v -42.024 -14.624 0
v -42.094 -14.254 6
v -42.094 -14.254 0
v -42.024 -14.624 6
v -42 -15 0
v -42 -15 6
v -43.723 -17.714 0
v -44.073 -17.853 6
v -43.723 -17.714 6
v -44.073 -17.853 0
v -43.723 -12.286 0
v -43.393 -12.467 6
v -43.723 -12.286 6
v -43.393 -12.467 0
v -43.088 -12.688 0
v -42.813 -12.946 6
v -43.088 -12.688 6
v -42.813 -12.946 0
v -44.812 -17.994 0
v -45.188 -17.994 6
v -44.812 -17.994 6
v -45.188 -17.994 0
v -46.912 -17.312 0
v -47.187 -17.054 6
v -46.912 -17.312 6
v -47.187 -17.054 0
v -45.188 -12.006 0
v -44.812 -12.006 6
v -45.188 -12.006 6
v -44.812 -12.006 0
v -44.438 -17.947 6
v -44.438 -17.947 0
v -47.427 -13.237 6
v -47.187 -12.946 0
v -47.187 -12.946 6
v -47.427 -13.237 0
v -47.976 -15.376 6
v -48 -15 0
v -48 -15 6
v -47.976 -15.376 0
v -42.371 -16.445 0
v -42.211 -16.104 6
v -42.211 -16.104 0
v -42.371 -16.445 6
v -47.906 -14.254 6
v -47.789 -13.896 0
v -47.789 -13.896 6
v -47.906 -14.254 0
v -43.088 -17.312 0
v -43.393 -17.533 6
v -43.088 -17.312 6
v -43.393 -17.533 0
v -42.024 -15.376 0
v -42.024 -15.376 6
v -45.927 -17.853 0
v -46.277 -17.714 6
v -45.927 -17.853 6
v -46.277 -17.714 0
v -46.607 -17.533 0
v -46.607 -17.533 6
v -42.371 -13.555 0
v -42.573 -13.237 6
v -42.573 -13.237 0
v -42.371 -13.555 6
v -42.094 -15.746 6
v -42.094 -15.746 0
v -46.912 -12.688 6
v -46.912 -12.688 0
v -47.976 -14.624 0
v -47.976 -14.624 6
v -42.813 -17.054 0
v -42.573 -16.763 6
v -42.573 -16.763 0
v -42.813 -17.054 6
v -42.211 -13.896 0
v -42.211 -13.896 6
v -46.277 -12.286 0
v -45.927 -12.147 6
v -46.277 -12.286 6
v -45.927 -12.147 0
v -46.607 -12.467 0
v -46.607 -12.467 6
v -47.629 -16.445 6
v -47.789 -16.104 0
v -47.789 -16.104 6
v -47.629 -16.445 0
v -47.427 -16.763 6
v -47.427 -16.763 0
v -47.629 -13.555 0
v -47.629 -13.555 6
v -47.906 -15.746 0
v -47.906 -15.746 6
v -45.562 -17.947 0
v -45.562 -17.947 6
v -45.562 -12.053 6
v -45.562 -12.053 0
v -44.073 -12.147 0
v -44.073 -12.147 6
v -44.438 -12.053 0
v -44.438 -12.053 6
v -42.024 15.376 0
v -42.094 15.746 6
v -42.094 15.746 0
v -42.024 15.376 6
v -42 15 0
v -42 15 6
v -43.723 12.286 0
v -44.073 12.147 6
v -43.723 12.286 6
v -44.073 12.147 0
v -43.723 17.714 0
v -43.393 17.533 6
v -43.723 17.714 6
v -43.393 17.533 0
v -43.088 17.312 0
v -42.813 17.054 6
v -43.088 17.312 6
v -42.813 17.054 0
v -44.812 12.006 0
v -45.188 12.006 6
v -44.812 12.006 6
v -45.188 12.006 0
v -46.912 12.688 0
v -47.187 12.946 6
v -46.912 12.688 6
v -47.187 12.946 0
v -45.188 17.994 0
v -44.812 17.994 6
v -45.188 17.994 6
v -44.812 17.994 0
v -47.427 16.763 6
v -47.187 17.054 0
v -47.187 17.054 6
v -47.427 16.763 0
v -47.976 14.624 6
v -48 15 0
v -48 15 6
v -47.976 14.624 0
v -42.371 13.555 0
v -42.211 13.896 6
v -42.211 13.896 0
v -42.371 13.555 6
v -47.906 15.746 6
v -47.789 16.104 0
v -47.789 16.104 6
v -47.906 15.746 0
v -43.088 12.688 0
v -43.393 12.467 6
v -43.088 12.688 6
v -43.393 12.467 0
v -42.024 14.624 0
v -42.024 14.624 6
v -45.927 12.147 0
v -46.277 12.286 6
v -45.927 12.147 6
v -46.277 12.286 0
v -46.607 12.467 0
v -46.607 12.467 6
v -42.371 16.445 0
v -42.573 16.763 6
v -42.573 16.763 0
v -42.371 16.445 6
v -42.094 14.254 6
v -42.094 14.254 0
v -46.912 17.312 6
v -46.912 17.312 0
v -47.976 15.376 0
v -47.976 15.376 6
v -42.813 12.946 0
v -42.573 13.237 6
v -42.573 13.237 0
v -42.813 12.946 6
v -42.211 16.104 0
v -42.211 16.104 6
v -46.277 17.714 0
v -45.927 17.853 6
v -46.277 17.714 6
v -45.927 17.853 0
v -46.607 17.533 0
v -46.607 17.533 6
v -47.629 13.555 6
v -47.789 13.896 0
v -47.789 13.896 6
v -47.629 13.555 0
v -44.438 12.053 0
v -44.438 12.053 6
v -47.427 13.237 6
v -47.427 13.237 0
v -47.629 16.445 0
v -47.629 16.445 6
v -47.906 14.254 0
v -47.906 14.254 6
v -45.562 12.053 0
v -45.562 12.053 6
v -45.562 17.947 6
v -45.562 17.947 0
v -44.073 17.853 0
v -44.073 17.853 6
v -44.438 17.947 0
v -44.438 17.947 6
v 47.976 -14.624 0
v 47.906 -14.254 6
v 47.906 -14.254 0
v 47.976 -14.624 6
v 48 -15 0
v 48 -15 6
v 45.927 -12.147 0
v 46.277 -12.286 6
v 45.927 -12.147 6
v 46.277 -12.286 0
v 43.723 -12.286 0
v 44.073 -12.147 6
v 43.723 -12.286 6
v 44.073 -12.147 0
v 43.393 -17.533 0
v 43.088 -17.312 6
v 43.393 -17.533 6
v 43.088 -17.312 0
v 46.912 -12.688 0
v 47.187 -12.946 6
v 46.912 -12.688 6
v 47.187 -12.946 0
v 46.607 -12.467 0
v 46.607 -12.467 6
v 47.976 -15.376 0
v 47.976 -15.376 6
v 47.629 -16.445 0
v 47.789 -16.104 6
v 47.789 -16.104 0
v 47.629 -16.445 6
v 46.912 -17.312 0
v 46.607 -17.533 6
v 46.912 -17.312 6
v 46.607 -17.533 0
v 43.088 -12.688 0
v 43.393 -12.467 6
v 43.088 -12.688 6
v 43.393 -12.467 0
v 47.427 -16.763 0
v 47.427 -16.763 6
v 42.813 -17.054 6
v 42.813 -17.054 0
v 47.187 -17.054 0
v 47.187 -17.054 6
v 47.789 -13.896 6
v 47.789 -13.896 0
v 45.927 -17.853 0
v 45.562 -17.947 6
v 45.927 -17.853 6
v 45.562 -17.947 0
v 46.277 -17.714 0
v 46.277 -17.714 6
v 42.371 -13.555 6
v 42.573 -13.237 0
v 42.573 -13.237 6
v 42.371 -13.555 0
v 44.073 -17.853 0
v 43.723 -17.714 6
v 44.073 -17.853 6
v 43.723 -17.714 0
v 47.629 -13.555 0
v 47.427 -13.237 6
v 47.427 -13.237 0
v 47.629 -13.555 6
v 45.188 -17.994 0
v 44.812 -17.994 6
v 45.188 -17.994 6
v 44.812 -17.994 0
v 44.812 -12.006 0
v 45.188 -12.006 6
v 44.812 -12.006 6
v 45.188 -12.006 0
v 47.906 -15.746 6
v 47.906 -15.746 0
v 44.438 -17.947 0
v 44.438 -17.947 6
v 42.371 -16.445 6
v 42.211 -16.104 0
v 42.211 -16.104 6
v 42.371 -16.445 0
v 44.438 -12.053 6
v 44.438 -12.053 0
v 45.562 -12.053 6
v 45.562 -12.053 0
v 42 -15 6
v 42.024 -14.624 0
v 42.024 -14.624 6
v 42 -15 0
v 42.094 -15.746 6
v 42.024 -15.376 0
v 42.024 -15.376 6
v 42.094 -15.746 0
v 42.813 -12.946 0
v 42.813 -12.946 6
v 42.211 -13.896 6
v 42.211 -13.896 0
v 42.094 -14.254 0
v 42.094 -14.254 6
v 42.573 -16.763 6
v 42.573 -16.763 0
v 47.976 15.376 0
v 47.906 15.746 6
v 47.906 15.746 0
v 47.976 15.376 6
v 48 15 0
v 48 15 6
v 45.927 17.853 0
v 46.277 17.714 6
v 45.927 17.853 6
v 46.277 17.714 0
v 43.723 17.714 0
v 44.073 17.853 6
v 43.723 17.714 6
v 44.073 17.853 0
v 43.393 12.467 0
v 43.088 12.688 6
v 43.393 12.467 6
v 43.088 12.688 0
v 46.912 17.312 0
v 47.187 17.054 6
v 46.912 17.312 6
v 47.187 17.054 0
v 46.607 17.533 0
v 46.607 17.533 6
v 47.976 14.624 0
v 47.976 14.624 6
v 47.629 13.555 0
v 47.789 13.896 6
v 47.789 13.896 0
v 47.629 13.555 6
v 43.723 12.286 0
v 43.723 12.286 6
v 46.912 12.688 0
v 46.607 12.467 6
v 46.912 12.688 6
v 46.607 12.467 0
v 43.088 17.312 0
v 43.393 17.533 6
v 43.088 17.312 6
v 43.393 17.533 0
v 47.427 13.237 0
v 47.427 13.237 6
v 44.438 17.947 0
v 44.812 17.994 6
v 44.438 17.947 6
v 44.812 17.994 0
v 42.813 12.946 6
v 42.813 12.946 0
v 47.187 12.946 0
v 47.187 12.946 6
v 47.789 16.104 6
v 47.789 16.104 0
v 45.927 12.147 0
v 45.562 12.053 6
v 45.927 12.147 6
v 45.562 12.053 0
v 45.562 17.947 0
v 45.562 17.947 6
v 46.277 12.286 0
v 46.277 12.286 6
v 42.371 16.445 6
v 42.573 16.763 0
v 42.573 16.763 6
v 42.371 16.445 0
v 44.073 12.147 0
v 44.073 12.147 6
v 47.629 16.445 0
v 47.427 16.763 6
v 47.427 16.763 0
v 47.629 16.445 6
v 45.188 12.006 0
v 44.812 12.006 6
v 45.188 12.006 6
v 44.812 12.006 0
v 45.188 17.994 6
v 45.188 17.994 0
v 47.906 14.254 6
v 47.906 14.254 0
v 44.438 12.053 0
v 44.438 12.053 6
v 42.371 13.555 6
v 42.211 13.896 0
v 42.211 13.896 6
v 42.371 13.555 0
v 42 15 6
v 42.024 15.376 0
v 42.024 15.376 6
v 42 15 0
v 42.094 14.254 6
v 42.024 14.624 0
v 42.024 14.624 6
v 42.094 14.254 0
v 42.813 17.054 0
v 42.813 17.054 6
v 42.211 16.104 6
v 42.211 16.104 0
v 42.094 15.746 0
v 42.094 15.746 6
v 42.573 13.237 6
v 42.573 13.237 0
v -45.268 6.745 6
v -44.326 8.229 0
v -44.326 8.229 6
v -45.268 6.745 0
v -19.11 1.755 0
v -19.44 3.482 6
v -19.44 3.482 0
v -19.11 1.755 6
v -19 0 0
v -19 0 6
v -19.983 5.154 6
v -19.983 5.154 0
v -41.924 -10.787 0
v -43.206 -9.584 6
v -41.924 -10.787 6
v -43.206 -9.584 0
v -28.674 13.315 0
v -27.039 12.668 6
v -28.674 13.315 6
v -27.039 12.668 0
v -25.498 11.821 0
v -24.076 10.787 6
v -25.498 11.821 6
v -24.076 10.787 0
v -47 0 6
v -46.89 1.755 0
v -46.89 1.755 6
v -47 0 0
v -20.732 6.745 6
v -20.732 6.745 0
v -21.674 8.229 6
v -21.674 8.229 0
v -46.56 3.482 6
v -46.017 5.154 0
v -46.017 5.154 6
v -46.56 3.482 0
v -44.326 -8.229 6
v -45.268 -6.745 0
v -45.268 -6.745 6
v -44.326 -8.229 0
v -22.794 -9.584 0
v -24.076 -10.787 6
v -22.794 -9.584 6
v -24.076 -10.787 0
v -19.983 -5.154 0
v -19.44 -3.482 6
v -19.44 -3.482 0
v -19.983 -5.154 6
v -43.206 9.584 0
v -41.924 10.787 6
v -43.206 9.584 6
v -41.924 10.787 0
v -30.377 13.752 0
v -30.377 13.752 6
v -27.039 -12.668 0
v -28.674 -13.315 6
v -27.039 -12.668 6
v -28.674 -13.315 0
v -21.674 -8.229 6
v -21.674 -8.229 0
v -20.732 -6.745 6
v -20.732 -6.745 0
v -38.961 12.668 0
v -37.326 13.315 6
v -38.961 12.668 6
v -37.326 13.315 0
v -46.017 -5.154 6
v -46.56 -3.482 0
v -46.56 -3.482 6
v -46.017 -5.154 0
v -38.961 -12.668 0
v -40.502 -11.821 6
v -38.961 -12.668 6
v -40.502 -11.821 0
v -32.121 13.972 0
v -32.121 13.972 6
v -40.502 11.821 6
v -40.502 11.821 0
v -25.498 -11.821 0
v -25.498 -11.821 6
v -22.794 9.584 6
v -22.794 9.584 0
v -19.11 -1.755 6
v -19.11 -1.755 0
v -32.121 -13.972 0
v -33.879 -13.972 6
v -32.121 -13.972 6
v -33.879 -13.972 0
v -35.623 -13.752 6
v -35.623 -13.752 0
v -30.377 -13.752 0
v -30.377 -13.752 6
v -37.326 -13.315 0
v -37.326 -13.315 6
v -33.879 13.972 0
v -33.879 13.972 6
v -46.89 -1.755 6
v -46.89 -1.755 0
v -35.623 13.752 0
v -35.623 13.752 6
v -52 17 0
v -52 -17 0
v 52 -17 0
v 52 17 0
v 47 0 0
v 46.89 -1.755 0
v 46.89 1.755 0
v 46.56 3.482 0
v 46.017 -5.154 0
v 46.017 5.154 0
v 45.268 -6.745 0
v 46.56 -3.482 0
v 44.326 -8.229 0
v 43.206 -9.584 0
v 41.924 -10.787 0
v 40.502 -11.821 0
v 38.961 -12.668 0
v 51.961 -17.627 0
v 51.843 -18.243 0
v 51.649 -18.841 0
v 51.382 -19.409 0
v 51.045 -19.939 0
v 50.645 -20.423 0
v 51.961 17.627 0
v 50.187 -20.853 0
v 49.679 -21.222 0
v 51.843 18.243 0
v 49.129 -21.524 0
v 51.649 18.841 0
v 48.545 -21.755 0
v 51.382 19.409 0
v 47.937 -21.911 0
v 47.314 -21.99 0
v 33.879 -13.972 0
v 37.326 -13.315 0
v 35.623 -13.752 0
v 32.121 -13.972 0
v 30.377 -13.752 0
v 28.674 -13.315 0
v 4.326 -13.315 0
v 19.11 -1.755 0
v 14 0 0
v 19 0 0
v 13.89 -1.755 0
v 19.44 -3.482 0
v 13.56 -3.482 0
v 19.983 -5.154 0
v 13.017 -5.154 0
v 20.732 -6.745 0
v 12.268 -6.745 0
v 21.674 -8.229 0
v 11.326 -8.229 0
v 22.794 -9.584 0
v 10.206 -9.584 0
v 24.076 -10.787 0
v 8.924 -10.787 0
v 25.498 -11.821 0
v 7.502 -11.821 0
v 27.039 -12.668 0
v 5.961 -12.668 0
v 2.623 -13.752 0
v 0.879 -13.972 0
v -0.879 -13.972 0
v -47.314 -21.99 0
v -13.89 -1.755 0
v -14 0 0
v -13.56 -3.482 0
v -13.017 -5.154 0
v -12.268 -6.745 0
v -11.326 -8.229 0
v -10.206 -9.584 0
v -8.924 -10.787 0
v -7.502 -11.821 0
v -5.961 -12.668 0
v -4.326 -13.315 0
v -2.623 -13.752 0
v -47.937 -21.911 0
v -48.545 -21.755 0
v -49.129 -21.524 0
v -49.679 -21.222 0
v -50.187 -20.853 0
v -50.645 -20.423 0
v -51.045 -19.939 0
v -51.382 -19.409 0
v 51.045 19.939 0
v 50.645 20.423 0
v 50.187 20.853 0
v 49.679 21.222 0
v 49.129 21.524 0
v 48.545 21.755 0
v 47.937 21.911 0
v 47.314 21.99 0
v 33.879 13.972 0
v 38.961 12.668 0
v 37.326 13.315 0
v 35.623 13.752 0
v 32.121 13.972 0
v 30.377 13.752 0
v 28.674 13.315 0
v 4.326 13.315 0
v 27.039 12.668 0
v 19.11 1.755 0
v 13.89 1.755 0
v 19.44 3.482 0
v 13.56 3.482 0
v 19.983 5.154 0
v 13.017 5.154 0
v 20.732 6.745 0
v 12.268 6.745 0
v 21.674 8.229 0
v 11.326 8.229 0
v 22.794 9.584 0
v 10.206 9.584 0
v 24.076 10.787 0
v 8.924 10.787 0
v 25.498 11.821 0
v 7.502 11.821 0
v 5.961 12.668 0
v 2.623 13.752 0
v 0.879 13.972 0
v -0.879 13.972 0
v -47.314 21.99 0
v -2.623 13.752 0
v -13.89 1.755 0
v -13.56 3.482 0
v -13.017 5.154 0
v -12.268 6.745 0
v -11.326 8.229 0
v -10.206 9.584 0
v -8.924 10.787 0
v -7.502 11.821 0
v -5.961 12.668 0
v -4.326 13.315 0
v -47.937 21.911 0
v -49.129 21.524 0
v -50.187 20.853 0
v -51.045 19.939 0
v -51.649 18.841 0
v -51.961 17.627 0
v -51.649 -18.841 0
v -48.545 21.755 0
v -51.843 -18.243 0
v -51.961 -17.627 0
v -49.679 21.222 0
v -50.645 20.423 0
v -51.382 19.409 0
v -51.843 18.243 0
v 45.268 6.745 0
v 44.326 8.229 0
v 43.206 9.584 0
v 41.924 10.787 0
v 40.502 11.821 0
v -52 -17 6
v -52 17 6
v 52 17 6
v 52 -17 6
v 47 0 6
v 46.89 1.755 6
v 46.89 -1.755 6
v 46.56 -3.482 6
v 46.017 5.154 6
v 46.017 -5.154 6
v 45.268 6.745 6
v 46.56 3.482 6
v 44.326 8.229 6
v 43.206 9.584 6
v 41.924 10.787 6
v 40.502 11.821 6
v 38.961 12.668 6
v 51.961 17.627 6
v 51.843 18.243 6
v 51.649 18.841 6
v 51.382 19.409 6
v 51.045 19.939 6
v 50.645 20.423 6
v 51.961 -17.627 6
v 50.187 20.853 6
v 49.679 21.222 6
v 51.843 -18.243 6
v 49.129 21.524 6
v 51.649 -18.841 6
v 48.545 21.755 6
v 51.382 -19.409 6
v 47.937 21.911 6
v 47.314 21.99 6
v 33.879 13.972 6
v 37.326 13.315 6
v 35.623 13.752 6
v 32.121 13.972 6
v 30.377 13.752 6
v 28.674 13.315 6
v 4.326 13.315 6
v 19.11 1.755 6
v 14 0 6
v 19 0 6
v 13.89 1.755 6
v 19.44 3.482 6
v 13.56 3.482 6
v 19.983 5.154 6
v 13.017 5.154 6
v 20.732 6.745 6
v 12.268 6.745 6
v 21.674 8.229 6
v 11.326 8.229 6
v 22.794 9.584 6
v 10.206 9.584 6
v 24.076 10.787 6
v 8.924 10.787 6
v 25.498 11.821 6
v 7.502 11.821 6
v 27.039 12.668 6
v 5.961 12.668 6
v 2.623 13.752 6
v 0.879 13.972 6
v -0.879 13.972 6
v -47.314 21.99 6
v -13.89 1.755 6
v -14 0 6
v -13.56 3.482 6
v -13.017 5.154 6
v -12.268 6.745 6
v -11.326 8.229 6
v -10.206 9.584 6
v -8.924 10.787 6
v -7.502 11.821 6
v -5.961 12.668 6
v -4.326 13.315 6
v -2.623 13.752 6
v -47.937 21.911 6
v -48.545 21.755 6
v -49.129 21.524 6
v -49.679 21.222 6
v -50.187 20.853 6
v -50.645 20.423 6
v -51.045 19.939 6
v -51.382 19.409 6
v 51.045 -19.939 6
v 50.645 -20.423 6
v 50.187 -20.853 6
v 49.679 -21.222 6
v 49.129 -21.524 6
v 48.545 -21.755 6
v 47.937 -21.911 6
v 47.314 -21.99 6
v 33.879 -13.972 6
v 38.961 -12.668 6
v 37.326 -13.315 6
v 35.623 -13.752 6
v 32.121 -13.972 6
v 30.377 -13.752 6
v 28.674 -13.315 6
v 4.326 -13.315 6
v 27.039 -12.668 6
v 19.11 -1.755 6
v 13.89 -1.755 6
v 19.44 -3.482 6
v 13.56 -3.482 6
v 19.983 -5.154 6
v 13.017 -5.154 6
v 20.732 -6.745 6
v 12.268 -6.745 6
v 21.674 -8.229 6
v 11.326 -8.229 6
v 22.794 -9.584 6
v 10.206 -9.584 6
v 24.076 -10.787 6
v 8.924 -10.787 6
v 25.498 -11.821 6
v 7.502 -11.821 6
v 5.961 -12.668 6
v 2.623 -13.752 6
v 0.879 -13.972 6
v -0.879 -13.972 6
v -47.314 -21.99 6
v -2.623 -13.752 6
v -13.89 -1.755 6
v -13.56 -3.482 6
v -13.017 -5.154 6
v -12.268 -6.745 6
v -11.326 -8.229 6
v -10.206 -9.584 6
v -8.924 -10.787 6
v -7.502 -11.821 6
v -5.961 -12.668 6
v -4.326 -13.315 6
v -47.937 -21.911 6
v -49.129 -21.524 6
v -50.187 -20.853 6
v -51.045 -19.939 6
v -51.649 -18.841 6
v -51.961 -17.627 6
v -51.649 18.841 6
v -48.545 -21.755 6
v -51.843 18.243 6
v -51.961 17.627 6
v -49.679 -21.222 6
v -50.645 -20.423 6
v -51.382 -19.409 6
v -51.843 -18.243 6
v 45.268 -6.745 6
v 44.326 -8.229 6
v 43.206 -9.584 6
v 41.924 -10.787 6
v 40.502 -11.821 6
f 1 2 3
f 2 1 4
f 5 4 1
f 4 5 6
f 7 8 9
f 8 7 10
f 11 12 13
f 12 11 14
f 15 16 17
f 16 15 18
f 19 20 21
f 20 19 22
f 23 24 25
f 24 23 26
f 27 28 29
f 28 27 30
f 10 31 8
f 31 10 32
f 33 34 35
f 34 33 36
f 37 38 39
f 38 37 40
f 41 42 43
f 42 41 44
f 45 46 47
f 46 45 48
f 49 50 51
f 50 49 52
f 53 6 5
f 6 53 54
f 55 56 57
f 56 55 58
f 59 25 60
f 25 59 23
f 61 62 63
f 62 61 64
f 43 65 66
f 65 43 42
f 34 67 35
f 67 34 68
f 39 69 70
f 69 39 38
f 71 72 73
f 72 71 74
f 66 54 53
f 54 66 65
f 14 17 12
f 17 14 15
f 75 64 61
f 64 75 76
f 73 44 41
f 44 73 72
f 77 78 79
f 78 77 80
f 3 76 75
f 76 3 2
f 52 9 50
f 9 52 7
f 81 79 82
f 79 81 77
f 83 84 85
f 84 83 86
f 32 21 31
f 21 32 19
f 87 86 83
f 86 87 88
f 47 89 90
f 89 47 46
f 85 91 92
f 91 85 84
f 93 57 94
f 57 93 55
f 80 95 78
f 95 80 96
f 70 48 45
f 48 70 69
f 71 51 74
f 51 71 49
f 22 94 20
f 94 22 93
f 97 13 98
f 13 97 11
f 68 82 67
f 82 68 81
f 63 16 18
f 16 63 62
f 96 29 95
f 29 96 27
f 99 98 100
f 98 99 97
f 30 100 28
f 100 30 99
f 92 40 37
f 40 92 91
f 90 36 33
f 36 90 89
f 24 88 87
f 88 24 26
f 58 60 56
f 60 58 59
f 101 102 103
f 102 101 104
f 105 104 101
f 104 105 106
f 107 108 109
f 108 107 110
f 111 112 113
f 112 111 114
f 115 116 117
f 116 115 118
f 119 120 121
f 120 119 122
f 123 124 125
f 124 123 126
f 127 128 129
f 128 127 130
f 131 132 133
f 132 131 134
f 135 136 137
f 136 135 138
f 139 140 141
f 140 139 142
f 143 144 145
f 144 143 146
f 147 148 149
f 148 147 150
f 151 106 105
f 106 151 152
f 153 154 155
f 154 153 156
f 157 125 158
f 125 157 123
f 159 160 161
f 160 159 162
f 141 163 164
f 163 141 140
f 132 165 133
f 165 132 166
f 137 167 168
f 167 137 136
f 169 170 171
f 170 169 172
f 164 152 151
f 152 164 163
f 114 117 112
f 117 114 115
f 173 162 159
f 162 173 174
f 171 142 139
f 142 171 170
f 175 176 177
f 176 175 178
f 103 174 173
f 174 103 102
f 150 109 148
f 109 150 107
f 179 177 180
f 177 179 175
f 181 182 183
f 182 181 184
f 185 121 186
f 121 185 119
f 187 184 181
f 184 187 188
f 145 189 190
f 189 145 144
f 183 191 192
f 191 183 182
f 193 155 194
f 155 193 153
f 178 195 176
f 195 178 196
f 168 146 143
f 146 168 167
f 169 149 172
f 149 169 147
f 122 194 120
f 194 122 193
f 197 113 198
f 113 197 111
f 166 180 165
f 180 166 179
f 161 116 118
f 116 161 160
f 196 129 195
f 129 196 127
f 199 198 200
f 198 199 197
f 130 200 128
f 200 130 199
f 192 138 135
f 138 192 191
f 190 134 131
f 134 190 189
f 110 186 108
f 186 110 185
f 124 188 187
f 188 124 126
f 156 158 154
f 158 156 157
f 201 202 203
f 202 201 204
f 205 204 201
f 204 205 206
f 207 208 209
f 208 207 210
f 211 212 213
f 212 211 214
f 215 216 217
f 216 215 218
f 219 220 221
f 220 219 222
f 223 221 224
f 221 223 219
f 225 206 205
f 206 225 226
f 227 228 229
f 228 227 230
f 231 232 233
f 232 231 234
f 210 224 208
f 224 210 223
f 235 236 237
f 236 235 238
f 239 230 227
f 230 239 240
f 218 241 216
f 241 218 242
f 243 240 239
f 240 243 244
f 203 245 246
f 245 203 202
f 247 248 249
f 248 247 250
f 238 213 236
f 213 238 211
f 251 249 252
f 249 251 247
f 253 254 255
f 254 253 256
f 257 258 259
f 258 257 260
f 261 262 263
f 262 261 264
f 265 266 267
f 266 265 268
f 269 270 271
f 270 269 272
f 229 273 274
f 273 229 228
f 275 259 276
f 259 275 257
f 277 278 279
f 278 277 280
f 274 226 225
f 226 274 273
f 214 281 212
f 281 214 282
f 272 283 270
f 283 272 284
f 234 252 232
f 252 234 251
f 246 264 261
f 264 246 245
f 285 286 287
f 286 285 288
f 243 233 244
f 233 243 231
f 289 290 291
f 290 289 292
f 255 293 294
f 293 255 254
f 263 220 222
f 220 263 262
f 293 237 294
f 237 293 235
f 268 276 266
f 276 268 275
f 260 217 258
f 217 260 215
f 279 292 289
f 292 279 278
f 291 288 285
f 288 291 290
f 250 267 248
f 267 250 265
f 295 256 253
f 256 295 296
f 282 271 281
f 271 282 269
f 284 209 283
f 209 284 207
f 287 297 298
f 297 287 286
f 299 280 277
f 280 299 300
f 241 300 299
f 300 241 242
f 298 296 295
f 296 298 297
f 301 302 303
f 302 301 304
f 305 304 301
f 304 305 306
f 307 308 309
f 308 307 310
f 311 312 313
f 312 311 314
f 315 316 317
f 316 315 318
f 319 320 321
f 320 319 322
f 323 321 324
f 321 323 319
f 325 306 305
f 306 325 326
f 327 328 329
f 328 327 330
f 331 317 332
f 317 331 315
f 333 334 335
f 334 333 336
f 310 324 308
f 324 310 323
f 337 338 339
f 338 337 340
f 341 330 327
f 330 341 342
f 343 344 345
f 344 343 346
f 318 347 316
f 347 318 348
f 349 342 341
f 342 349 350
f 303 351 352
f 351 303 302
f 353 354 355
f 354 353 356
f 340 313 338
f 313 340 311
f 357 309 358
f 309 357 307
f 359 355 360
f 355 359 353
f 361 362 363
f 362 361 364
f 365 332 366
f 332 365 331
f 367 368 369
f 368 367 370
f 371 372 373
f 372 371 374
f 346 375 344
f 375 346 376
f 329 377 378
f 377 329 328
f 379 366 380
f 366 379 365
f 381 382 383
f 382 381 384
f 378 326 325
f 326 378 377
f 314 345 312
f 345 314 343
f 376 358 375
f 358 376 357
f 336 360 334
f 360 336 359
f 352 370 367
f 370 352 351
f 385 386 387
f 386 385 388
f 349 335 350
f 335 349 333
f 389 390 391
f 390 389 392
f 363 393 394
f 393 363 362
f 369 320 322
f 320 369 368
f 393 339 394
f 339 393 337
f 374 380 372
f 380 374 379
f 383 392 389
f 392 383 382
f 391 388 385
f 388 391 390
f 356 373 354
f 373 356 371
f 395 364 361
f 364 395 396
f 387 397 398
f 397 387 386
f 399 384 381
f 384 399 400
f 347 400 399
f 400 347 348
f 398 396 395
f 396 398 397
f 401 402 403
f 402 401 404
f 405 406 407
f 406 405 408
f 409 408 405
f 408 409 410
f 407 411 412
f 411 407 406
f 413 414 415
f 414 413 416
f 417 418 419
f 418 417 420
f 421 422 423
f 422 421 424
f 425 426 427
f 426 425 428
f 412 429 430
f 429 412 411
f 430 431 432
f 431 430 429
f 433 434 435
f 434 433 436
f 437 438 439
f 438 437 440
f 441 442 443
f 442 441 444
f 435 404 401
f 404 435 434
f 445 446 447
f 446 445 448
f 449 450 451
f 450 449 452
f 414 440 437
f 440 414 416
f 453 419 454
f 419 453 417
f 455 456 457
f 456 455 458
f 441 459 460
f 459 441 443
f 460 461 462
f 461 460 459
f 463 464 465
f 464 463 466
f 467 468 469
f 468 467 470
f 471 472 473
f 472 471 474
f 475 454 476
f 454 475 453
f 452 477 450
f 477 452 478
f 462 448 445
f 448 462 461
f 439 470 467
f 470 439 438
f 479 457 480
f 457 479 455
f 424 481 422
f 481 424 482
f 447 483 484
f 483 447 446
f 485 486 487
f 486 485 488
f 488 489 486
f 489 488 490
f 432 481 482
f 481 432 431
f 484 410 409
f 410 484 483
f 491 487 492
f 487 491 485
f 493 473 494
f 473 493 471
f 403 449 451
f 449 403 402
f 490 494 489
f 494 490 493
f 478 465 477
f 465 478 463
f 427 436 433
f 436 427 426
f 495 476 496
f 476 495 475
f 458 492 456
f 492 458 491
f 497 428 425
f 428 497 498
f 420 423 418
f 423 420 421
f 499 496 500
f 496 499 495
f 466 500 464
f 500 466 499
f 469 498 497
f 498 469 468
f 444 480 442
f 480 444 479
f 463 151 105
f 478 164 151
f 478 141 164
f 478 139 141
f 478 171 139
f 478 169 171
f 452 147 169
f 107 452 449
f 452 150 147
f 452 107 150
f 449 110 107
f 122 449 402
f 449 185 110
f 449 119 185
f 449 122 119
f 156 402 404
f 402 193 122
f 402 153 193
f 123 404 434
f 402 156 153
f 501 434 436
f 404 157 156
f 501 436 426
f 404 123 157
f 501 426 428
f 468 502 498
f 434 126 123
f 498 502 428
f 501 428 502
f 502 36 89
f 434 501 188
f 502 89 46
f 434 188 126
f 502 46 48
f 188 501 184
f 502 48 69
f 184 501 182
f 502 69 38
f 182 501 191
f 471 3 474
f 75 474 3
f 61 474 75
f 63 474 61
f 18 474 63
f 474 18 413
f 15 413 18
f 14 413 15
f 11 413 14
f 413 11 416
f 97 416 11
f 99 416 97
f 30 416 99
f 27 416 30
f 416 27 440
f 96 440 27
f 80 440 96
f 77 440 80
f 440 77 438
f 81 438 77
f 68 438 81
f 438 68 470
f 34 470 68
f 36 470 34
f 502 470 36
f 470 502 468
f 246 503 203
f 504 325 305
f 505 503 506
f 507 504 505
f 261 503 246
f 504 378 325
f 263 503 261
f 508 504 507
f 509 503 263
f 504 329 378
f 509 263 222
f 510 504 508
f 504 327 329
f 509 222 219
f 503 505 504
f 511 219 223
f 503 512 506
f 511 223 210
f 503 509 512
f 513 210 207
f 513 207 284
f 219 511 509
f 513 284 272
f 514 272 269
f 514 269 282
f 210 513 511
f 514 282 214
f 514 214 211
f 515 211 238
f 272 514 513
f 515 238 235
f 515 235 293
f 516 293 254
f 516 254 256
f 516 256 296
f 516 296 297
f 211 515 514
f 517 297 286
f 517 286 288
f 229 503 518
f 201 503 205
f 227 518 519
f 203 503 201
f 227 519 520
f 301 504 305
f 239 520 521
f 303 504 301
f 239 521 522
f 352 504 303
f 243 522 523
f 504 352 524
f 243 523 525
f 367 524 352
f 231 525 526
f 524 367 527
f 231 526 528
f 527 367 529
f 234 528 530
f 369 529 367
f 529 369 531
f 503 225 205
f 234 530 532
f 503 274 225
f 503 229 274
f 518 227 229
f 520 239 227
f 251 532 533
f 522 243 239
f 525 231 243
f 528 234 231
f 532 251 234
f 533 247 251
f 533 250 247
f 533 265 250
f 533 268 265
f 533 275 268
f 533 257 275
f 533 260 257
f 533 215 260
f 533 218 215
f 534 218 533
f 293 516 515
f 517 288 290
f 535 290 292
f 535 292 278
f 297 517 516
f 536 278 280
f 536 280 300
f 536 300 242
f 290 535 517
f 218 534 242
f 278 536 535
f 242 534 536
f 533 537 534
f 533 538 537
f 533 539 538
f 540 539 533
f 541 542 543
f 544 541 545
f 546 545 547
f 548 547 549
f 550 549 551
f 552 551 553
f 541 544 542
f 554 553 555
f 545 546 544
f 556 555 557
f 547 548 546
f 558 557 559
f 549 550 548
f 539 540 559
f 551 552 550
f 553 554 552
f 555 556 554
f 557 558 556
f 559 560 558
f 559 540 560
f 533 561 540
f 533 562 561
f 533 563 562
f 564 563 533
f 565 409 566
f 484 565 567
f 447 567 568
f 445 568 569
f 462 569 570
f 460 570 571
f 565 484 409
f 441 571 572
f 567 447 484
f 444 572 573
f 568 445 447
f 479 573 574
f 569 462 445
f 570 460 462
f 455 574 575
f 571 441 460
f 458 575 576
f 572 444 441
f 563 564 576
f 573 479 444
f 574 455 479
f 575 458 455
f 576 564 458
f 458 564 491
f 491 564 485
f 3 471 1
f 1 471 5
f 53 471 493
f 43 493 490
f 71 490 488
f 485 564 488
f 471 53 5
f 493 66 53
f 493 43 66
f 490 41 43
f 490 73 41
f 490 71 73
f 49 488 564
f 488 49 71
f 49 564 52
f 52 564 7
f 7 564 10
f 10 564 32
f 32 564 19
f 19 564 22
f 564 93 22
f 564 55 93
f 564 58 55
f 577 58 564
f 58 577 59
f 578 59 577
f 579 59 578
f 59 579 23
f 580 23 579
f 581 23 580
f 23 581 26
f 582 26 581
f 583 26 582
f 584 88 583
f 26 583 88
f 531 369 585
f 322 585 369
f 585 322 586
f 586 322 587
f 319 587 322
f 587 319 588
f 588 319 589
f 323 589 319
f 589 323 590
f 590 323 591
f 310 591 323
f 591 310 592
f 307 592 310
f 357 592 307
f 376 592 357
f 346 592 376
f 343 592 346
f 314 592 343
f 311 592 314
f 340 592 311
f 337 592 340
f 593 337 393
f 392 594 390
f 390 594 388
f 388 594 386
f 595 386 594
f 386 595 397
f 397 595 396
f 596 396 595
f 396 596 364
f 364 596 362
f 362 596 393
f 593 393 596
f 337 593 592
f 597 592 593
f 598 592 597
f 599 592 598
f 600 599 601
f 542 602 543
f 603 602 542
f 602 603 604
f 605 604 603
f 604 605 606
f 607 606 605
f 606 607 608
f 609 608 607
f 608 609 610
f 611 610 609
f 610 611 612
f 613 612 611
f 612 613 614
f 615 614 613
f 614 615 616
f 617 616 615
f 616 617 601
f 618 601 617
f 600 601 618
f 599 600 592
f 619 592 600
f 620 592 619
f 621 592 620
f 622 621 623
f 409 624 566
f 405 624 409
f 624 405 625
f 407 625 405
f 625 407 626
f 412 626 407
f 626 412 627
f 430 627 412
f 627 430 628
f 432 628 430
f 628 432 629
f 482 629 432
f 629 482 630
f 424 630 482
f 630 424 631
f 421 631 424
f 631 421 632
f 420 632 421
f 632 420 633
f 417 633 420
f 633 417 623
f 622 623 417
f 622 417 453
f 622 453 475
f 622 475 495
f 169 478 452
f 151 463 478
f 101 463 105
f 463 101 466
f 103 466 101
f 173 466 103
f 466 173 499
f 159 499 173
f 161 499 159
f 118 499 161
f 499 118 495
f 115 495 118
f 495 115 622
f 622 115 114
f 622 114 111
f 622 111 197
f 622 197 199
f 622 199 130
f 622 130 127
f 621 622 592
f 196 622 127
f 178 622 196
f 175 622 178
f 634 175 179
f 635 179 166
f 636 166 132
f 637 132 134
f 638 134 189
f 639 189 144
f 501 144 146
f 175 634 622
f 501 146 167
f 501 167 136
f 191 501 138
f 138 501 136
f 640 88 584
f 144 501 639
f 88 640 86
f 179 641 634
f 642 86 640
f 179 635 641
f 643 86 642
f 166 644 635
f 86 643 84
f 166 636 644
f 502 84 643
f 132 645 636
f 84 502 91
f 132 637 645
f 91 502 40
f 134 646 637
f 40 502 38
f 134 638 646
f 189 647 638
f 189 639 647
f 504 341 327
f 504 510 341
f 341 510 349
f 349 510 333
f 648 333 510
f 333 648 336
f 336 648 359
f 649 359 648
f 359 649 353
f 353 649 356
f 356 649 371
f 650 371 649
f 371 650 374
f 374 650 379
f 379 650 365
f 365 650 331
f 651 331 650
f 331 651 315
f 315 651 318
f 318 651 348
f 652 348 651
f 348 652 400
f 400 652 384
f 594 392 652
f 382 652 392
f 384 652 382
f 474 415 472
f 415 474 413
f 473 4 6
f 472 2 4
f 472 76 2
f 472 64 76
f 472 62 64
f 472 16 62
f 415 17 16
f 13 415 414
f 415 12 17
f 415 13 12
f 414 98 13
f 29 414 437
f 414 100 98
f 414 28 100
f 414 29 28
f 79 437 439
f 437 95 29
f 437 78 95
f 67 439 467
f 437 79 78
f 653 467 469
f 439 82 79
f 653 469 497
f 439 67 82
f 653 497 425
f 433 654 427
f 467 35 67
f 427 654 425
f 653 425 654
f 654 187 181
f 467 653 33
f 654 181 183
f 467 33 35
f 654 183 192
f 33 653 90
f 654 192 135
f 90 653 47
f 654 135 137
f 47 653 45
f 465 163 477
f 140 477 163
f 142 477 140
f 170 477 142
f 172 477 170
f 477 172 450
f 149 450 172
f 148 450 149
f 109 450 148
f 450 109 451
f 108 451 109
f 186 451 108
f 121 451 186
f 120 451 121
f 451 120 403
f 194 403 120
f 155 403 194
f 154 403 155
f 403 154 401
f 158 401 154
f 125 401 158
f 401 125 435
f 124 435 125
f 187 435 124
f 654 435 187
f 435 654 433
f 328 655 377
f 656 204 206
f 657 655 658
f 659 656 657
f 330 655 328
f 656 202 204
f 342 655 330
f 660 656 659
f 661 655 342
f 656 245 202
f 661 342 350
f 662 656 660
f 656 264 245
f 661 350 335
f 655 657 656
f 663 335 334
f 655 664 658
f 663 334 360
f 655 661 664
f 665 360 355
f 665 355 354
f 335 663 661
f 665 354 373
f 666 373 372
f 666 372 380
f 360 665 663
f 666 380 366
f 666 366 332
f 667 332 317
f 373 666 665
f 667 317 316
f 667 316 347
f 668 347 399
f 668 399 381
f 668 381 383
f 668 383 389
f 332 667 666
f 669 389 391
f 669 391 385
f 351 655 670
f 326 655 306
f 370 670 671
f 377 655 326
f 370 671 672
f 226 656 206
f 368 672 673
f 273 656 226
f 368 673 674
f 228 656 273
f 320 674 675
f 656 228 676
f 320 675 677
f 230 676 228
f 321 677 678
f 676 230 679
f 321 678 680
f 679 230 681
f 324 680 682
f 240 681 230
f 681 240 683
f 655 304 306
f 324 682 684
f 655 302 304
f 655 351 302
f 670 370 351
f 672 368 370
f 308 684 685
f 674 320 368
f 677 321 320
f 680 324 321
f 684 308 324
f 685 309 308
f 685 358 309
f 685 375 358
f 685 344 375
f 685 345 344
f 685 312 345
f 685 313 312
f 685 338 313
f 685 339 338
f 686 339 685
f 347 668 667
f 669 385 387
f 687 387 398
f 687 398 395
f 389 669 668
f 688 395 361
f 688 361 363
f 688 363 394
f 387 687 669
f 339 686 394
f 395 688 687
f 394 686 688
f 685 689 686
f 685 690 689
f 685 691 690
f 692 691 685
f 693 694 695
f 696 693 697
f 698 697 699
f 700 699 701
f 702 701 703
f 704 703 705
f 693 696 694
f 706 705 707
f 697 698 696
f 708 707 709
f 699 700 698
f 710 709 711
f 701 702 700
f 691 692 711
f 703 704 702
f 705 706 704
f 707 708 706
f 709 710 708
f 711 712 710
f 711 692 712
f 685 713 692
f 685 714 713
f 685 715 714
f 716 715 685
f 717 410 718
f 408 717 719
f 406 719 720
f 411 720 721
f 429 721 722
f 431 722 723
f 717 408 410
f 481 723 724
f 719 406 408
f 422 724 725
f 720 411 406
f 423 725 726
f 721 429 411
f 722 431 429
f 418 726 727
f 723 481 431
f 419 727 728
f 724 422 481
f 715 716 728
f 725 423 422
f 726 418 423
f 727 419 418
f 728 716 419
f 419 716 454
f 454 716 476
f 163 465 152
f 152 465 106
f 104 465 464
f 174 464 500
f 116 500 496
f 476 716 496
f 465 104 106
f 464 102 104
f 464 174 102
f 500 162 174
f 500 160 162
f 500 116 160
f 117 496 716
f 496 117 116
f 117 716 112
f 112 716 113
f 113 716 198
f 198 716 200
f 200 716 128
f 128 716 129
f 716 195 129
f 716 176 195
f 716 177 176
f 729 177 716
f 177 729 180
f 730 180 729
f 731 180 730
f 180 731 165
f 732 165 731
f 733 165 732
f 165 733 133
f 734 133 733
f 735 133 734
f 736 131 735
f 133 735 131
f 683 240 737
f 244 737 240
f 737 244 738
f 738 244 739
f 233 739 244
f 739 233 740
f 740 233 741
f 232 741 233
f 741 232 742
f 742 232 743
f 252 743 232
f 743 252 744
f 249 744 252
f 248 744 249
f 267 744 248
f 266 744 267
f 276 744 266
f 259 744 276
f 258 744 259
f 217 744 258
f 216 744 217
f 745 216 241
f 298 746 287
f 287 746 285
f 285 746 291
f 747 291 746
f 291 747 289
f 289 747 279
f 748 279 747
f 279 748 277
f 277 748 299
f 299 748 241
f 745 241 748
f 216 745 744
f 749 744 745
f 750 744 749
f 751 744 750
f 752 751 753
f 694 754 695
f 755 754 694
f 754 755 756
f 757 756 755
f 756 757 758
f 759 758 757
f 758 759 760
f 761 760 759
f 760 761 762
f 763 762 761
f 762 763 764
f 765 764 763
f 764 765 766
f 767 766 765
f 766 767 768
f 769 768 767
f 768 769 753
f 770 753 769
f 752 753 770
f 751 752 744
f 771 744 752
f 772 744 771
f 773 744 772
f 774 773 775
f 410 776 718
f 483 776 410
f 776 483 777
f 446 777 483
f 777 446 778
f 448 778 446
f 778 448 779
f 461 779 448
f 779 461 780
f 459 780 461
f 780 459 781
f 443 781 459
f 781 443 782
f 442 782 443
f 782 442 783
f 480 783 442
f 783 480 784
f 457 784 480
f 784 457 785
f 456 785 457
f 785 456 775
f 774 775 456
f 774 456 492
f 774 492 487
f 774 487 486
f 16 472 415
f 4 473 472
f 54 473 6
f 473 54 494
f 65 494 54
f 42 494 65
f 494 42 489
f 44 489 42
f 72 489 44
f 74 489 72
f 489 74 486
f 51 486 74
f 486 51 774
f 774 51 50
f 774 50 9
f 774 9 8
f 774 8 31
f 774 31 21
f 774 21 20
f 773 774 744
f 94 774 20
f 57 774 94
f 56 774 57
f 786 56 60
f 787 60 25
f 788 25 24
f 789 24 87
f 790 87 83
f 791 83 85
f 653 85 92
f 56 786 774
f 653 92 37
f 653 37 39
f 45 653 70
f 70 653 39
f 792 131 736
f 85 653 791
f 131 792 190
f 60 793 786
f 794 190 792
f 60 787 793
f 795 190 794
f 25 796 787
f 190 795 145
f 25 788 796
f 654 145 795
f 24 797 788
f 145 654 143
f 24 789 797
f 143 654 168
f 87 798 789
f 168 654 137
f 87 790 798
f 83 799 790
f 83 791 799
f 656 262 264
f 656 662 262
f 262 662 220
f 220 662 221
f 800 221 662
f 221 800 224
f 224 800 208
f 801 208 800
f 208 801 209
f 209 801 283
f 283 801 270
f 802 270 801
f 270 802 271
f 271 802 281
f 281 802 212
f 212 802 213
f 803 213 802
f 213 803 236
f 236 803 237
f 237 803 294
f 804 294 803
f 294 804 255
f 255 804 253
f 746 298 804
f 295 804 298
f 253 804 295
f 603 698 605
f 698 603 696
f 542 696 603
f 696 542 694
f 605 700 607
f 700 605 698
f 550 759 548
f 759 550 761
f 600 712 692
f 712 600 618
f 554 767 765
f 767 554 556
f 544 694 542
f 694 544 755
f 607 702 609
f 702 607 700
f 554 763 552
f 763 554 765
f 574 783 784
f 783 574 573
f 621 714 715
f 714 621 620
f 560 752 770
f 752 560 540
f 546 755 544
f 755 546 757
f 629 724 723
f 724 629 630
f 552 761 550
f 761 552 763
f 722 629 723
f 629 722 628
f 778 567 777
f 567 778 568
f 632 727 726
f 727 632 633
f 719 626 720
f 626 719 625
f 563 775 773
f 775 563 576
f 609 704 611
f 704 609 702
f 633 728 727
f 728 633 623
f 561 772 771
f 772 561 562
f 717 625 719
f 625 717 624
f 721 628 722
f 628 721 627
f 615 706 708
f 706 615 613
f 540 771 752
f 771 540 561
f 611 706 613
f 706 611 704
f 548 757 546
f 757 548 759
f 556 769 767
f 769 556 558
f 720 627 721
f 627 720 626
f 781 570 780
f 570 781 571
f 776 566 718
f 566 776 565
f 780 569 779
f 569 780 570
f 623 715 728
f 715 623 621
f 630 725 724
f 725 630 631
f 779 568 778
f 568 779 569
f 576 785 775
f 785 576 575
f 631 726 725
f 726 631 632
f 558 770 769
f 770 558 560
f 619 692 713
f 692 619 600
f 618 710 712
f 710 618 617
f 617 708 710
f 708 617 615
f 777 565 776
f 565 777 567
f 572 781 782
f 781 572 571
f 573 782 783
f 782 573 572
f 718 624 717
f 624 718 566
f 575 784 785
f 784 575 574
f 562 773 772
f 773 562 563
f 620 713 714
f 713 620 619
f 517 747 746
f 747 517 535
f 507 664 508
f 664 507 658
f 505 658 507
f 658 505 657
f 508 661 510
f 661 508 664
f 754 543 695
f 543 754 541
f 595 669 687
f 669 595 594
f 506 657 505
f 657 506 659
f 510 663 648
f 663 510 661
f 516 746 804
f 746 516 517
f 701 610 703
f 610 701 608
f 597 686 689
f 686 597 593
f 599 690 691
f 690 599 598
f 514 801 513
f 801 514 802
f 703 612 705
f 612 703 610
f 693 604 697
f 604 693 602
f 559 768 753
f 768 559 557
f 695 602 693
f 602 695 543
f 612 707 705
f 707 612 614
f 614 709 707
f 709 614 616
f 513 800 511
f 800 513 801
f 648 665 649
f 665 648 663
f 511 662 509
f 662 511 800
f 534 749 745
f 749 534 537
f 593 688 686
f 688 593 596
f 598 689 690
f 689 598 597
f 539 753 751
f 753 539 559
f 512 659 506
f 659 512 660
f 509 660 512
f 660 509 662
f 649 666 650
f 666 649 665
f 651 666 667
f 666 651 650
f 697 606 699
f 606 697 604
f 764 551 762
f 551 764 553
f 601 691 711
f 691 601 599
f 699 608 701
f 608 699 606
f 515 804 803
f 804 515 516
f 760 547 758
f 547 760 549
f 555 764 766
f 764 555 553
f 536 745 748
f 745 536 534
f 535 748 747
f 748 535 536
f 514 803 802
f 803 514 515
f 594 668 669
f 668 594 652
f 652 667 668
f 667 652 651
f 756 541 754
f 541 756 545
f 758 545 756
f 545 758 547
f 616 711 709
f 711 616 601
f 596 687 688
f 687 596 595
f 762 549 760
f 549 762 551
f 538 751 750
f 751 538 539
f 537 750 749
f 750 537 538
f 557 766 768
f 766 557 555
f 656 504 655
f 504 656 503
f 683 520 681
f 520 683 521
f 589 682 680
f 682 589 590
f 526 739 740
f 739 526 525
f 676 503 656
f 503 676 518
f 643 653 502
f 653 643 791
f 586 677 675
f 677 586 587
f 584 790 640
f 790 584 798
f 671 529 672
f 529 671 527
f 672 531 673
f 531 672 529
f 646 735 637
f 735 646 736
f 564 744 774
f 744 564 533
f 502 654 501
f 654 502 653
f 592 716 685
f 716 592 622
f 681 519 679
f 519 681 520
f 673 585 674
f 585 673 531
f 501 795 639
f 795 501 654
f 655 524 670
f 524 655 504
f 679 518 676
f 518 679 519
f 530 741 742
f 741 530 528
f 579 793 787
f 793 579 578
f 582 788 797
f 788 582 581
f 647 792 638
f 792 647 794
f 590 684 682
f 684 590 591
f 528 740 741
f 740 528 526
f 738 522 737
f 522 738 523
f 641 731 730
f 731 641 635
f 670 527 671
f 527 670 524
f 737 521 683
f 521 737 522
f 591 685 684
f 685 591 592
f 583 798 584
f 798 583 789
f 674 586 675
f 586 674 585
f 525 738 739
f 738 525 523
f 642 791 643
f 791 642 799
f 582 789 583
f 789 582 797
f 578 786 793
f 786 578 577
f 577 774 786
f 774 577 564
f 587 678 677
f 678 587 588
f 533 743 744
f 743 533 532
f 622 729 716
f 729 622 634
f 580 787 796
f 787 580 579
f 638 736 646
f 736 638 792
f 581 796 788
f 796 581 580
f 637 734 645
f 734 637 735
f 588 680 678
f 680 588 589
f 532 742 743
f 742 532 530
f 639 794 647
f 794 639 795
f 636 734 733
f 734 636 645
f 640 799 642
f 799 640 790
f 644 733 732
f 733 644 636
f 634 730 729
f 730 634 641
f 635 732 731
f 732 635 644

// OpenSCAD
$fn = 50;


difference() {
	union() {
		hull() {
			translate(v = [-47.0000000000, 17.0000000000, 0]) {
				cylinder(h = 6, r = 5);
			}
			translate(v = [47.0000000000, 17.0000000000, 0]) {
				cylinder(h = 6, r = 5);
			}
			translate(v = [-47.0000000000, -17.0000000000, 0]) {
				cylinder(h = 6, r = 5);
			}
			translate(v = [47.0000000000, -17.0000000000, 0]) {
				cylinder(h = 6, r = 5);
			}
		}
	}
	union() {
		#translate(v = [-45.0000000000, -15.0000000000, -100.0000000000]) {
			cylinder(h = 200, r = 3.0000000000);
		}
		#translate(v = [-45.0000000000, 15.0000000000, -100.0000000000]) {
			cylinder(h = 200, r = 3.0000000000);
		}
		#translate(v = [45.0000000000, -15.0000000000, -100.0000000000]) {
			cylinder(h = 200, r = 3.0000000000);
		}
		#translate(v = [45.0000000000, 15.0000000000, -100.0000000000]) {
			cylinder(h = 200, r = 3.0000000000);
		}
		#translate(v = [-33.0000000000, 0, 0]) {
			cylinder(h = 6, r = 14.0000000000);
		}
		#cylinder(h = 6, r = 14.0000000000);
		#translate(v = [33.0000000000, 0, 0]) {
			cylinder(h = 6, r = 14.0000000000);
		}
	}
}
